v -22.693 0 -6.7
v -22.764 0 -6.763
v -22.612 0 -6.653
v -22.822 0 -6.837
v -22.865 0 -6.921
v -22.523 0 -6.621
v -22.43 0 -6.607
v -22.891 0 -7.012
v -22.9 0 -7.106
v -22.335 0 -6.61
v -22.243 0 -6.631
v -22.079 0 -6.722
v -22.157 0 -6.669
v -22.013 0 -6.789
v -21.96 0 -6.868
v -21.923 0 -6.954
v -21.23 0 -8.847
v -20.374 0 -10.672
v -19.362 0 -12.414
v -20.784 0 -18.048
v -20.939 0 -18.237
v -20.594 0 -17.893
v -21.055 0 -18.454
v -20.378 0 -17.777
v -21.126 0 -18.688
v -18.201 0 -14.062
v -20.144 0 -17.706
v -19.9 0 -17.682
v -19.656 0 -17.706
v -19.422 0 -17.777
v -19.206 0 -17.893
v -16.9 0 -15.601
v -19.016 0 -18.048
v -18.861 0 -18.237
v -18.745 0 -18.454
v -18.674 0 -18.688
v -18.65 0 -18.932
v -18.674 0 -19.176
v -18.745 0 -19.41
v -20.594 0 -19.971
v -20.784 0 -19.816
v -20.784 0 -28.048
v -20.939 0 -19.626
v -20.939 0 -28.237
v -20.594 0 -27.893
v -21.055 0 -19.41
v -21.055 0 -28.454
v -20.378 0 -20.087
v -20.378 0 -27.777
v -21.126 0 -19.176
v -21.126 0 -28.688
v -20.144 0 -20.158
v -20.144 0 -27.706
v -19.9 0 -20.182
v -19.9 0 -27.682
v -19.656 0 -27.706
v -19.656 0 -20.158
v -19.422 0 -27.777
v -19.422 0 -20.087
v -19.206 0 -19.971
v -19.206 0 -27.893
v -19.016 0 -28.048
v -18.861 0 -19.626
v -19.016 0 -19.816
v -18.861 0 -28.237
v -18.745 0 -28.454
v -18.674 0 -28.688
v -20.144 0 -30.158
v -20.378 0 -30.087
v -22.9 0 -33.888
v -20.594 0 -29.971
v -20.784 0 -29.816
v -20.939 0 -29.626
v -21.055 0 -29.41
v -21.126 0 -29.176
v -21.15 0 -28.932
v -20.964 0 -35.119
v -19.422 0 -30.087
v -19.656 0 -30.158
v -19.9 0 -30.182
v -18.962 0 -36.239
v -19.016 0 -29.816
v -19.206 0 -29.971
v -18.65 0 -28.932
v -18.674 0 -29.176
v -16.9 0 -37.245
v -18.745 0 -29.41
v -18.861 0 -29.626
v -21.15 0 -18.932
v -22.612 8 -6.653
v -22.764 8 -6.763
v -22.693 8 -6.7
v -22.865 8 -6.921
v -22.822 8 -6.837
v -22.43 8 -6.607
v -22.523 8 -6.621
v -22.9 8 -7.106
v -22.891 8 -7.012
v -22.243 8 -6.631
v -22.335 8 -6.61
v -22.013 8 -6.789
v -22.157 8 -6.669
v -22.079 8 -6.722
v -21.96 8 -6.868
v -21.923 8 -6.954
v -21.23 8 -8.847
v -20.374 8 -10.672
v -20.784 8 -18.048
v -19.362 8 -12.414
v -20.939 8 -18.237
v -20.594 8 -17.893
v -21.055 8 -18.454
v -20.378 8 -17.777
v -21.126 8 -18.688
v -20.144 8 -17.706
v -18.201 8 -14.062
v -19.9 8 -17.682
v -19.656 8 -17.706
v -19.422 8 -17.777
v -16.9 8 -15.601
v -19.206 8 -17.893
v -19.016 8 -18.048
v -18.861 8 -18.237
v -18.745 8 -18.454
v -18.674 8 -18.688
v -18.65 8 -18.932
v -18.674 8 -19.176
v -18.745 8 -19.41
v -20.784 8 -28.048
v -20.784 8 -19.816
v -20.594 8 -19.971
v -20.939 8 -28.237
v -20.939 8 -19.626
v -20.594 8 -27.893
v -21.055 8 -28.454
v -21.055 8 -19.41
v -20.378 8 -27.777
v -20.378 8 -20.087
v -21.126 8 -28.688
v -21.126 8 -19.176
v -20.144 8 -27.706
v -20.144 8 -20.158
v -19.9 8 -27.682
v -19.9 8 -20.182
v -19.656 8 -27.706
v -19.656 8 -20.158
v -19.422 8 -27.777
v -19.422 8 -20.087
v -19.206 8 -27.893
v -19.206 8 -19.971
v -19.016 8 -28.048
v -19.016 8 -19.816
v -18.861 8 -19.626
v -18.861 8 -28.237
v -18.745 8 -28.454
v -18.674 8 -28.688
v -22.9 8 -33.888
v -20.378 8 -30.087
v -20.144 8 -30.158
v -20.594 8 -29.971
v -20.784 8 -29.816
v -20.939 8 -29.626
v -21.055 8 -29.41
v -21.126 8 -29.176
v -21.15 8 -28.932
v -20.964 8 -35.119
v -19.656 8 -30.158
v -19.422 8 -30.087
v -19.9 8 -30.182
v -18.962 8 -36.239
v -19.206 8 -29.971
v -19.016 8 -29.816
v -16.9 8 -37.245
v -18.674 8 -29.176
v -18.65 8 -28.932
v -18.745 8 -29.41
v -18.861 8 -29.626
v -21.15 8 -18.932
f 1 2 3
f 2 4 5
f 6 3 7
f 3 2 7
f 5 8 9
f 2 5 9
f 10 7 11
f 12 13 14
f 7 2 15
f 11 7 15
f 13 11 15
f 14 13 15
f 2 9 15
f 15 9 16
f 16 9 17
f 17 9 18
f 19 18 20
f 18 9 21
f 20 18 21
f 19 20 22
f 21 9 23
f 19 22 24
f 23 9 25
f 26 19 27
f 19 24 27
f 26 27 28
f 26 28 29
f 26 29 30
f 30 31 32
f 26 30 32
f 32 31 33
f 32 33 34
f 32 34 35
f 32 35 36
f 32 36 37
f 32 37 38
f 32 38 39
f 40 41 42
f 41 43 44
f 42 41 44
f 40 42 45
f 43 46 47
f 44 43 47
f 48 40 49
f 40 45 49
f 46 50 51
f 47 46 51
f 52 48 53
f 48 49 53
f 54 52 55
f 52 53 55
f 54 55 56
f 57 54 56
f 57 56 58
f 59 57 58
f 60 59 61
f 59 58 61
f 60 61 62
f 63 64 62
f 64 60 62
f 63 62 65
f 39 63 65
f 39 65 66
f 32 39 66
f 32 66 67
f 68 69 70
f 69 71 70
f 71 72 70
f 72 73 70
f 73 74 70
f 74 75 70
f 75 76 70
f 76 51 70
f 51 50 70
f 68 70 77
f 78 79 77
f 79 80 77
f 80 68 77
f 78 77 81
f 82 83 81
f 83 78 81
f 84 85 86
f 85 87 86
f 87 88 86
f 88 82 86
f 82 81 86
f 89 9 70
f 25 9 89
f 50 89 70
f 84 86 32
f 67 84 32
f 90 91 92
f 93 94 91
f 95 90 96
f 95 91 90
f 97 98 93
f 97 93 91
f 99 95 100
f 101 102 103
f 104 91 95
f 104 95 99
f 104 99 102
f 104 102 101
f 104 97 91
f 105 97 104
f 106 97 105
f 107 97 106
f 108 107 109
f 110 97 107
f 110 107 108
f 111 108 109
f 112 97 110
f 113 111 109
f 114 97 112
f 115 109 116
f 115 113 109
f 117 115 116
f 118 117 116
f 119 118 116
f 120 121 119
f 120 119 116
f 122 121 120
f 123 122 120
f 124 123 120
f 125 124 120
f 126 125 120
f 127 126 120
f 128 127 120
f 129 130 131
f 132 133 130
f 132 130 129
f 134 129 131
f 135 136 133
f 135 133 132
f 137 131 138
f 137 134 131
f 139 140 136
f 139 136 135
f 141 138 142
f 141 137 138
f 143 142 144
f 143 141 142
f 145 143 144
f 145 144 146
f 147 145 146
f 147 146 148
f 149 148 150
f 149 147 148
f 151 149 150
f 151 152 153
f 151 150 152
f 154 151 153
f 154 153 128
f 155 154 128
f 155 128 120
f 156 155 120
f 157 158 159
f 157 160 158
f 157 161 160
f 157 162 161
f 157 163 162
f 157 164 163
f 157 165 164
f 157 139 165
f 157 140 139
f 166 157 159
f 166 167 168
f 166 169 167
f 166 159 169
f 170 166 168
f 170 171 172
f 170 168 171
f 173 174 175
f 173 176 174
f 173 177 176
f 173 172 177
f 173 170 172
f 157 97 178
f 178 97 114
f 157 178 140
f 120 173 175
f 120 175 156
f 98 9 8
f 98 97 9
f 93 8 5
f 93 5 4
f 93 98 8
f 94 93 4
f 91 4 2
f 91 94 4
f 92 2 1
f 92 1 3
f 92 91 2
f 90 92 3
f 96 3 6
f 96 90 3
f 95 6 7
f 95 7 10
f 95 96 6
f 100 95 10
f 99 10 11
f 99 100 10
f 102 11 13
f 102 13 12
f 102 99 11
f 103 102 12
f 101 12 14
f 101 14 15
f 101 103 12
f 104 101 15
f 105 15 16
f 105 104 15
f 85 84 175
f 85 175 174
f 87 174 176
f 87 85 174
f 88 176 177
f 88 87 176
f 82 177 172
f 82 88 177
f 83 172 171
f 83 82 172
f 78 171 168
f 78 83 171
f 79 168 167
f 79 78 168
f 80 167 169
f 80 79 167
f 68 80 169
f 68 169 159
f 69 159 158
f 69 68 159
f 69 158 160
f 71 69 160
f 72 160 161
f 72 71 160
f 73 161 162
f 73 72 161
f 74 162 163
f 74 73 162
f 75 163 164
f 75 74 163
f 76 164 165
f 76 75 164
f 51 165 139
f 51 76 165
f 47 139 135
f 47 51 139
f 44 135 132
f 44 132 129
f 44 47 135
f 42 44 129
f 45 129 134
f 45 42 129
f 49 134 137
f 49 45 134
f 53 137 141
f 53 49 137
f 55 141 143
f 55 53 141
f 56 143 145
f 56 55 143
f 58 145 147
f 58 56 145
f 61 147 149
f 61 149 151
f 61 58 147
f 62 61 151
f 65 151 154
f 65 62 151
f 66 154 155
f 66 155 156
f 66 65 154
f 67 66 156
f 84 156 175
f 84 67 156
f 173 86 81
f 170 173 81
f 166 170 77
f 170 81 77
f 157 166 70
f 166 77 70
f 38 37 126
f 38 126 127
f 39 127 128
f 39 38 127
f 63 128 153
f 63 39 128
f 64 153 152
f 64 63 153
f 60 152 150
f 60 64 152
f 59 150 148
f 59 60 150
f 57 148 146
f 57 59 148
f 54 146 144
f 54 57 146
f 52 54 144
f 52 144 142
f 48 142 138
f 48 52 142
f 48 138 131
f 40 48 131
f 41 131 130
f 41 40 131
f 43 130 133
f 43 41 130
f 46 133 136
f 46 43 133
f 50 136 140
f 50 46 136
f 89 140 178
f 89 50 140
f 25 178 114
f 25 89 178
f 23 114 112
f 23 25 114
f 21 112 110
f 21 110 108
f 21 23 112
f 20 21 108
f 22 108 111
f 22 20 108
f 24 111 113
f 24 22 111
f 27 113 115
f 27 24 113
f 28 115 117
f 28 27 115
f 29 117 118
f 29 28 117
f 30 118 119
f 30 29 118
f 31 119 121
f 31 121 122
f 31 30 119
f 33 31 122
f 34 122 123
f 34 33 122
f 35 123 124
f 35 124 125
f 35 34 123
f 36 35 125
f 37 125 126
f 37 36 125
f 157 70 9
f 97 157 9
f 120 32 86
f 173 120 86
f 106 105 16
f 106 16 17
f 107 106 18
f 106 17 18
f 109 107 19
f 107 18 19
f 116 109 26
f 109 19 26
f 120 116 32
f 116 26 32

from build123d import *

# Parameters (mm, degrees)
SKETCH_1_R      = 1.25
EXTRUDE_1_DEPTH = 8
FILLET_1_R      = 0.5


with BuildPart() as part:
    # 草图1 → 凸台-拉伸1 (new body)
    with BuildSketch(Plane(origin=(0, 0, 0), x_dir=(1, 0, 0), z_dir=(0, 1, 0))):
        with BuildLine():
            Line((-22.9, 33.888050991), (-22.9, 2.142428529))
            ThreePointArc((-22.9, 2.142428529), (-21.006975687, 9.365200078), (-16.9, 15.600961509))
            Line((-16.9, 15.600961509), (-16.9, 37.24513391))
            ThreePointArc((-16.9, 37.24513391), (-19.970666024, 35.692891429), (-22.9, 33.888050991))
        make_face()
        with Locations((-19.9, 28.931907268)):
            Circle(SKETCH_1_R, mode=Mode.SUBTRACT)
        with Locations((-19.9, 18.931907268)):
            Circle(SKETCH_1_R, mode=Mode.SUBTRACT)
    extrude(amount=EXTRUDE_1_DEPTH)

    # 圆角1
    fillet_1_edges = [part.edges().sort_by_distance(p)[0] for p in [
        (-22.9, 4, -2.142428529),
    ]]
    fillet(fillet_1_edges, radius=FILLET_1_R)


solid = part.part
